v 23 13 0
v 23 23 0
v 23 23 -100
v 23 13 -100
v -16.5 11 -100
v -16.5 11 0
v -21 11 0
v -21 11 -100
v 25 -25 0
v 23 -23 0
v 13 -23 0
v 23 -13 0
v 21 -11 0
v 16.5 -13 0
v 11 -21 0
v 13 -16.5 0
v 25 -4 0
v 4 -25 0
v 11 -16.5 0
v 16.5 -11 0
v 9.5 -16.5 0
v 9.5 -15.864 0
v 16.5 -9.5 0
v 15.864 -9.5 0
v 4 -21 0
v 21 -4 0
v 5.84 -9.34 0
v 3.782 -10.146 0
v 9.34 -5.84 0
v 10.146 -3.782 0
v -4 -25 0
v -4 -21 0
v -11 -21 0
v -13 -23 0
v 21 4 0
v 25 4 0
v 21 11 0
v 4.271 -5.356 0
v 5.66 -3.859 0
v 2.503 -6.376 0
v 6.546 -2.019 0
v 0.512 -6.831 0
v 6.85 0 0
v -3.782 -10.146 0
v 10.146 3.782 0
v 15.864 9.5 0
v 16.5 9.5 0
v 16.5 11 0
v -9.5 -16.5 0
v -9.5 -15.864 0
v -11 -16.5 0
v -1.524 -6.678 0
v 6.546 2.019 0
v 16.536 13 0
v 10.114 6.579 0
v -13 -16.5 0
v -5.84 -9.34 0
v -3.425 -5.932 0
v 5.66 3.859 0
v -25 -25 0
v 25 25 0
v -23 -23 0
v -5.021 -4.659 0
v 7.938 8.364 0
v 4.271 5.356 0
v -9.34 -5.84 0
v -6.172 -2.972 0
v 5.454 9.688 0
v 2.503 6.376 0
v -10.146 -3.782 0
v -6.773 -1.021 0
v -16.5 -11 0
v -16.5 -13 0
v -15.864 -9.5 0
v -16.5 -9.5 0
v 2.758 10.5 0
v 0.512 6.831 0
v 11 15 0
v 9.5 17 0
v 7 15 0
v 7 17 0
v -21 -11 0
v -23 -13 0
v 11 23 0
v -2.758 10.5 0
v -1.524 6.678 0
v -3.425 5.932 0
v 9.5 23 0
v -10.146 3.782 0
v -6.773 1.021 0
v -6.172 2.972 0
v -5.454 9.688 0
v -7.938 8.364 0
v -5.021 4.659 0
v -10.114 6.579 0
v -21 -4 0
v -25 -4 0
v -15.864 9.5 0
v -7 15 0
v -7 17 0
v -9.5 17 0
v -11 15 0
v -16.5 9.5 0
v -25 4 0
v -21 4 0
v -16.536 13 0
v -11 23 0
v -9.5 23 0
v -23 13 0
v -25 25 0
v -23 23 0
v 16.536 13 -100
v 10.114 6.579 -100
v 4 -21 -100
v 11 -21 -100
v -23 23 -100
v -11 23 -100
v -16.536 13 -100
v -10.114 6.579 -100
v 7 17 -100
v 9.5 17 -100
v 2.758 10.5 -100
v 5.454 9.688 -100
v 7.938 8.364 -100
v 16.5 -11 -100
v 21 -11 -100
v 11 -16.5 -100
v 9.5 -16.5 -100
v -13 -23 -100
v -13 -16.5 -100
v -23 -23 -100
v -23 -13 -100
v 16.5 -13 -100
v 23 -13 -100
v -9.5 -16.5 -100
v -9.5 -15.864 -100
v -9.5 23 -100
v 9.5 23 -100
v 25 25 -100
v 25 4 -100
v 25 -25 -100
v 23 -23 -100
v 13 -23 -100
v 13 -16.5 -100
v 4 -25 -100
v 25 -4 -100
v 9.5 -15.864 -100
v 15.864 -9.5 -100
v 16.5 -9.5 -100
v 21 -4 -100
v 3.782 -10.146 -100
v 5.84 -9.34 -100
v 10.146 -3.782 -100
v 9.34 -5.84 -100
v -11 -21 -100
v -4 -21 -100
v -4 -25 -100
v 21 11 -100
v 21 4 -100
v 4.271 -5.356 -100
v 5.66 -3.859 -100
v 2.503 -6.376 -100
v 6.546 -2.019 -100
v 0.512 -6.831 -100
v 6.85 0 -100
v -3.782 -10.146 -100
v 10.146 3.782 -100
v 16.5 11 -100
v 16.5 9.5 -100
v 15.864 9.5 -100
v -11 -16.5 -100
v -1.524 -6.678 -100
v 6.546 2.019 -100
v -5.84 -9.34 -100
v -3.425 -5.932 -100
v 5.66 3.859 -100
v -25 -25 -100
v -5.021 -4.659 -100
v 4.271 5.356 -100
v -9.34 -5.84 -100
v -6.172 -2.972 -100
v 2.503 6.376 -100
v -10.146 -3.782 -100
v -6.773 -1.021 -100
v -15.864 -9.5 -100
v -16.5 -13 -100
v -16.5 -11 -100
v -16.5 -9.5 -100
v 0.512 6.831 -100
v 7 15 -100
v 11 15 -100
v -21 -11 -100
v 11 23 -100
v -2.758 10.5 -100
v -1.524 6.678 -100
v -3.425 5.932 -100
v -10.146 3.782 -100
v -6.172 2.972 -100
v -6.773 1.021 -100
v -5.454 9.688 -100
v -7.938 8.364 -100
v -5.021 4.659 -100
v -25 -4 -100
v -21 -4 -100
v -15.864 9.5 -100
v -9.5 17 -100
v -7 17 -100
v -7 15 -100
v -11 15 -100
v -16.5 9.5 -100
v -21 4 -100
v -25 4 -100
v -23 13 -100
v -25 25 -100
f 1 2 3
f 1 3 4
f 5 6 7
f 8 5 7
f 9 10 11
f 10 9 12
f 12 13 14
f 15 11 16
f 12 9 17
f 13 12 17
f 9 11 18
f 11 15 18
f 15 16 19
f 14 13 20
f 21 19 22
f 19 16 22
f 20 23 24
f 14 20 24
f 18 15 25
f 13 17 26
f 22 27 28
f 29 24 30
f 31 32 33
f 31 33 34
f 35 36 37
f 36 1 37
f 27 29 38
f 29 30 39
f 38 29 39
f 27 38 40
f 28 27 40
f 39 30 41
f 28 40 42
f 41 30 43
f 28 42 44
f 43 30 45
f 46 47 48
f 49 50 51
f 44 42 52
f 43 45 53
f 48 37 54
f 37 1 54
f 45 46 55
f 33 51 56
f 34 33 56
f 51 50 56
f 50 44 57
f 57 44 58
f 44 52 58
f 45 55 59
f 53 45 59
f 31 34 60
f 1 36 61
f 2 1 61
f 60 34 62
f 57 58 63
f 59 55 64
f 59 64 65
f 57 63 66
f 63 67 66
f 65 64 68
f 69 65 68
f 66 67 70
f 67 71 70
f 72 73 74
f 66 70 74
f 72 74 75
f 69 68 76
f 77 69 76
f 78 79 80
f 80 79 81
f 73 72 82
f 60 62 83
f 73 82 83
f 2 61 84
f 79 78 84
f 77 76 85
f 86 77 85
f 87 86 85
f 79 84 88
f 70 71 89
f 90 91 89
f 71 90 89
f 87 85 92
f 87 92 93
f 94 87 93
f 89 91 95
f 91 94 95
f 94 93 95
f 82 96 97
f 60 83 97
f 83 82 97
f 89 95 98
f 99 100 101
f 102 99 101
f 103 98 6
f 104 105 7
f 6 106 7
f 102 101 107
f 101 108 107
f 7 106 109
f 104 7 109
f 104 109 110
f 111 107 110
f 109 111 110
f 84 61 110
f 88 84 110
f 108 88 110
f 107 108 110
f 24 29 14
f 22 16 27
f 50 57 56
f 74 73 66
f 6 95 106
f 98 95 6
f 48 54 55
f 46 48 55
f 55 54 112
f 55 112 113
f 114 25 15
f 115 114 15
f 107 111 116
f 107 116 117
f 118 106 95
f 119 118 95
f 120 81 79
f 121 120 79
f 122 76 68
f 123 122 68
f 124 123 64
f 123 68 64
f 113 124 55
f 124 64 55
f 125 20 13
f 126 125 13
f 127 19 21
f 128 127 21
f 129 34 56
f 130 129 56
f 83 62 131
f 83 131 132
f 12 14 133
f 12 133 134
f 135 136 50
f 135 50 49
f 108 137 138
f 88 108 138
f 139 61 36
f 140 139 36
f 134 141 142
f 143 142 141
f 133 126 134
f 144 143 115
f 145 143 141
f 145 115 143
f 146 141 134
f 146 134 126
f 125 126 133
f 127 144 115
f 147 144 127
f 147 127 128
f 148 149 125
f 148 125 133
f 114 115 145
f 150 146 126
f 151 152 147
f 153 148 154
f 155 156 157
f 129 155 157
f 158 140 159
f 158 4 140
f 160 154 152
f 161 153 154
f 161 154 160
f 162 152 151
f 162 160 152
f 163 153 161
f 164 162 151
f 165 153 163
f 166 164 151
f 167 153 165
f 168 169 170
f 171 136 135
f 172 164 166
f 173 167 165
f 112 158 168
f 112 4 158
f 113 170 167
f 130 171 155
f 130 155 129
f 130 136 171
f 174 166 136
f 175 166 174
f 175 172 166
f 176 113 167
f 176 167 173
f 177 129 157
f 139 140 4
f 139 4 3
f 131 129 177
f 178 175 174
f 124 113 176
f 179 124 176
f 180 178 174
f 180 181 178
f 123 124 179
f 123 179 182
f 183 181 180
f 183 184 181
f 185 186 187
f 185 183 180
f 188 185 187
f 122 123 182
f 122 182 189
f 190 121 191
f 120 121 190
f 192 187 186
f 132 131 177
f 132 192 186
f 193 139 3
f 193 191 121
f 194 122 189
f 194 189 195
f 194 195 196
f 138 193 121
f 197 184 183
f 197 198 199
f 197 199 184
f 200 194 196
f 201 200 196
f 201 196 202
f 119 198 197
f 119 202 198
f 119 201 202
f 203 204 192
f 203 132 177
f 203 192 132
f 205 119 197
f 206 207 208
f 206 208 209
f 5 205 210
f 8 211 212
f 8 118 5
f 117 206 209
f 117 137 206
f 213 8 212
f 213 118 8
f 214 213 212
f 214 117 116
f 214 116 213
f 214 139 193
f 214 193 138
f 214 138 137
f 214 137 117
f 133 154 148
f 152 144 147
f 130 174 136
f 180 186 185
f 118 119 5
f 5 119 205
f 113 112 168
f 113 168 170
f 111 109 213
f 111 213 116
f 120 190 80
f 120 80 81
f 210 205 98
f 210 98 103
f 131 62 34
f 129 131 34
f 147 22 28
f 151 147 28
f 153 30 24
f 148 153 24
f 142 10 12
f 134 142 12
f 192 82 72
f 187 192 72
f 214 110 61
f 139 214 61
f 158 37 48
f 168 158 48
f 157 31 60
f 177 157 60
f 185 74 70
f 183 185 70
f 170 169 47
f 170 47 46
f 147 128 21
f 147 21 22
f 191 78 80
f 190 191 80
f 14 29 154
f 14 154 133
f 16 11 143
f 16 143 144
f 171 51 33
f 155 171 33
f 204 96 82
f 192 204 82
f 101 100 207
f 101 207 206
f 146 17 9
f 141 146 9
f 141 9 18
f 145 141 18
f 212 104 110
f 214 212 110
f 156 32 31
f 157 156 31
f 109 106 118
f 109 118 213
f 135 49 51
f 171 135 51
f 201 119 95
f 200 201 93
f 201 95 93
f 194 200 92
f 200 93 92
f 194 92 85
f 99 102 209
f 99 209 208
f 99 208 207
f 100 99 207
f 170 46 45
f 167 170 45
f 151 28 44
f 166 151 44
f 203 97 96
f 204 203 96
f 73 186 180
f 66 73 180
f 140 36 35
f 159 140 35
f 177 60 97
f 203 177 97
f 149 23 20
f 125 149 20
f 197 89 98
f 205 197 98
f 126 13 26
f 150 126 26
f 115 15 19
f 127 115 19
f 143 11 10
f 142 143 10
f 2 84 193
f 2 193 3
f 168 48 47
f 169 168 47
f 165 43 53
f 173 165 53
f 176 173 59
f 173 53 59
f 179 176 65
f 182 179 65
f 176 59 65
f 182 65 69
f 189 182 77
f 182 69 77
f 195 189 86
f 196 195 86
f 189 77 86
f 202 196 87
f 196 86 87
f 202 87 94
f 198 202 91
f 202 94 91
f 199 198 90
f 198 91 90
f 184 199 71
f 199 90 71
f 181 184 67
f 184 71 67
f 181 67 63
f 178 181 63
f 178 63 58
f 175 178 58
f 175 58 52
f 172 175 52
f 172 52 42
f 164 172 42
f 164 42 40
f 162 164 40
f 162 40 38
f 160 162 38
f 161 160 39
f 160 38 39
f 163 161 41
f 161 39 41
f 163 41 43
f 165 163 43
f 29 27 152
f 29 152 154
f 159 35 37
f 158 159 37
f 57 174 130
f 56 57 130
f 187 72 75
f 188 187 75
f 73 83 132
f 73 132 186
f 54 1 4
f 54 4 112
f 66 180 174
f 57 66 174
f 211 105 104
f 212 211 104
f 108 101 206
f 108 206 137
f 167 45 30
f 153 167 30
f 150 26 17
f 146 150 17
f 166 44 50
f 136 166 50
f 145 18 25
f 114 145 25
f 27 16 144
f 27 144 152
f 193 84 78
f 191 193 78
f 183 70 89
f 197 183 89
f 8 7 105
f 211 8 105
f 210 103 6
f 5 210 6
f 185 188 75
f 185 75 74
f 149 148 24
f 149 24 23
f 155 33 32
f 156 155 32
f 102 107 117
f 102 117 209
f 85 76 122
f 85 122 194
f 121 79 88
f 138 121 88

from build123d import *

# Parameters (mm, degrees)
SKETCH_A01_8_R     = 6.85
SKETCH_A01_8_W     = 10
SKETCH_A01_8_H     = 10
EXTRUDE1_DEPTH     = 100
CUT_EXTRUDE1_DEPTH = 101
CIRPATTERN1_COUNT  = 2
CIRPATTERN1_ANGLE  = 90
CUT_EXTRUDE2_DEPTH = 101
EXTRUDE3_DEPTH     = 100


with BuildPart() as part:
    # Sketch A01-8 → Extrude1 (new body)
    with BuildSketch(Plane.XY):
        Polygon((-16.5, -11), (-16.5, -9.5), (-15.863961, -9.5), (-10.14602885, -3.78206785), (-10.14602885, 3.78206785), (-15.863961, 9.5), (-16.5, 9.5), (-16.5, 11), (-21, 11), (-21, 4), (-25, 4), (-25, 25), (25, 25), (25, 4), (21, 4), (21, 11), (16.5, 11), (16.5, 9.5), (15.863961, 9.5), (10.14602885, 3.78206785), (10.14602885, -3.78206785), (15.863961, -9.5), (16.5, -9.5), (16.5, -11), (21, -11), (21, -4), (25, -4), (25, -25), (4, -25), (4, -21), (11, -21), (11, -16.5), (9.5, -16.5), (9.5, -15.863961), (3.78206785, -10.14602885), (-3.78206785, -10.14602885), (-9.5, -15.863961), (-9.5, -16.5), (-11, -16.5), (-11, -21), (-4, -21), (-4, -25), (-25, -25), (-25, -4), (-21, -4), (-21, -11), align=None)
        Circle(SKETCH_A01_8_R, mode=Mode.SUBTRACT)
        with Locations((-18, -18)):
            Rectangle(SKETCH_A01_8_W, SKETCH_A01_8_H, mode=Mode.SUBTRACT)
        with Locations((18, -18)):
            Rectangle(SKETCH_A01_8_W, SKETCH_A01_8_H, mode=Mode.SUBTRACT)
        Polygon((23, 13), (16.535534, 13), (14.035536811, 10.500002811), (-14.035536811, 10.500002811), (-16.535534, 13), (-23, 13), (-23, 23), (23, 23), align=None, mode=Mode.SUBTRACT)
    extrude(amount=-EXTRUDE1_DEPTH)

    # Sketch1 → Cut-Extrude1 (cut, through all)
    with BuildSketch(Plane.XY):
        Polygon((-16.5, -13), (-9.340048075, -5.840048075), (-5.840048075, -9.340048075), (-13, -16.5), align=None)
    cut_extrude1 = extrude(amount=-CUT_EXTRUDE1_DEPTH, mode=Mode.SUBTRACT)

    # CirPattern1: Cut-Extrude1 ×2 about axis
    cirpattern1_axis = Axis((0, 0, 0), (0, 0, 1))
    for i in range(1, CIRPATTERN1_COUNT):
        add(cut_extrude1.rotate(cirpattern1_axis, i * CIRPATTERN1_ANGLE / (CIRPATTERN1_COUNT - 1)), mode=Mode.SUBTRACT)

    # Sketch2 → Cut-Extrude2 (cut, through all)
    with BuildSketch(Plane.XY):
        with BuildLine():
            Line((-14.035536811, 10.500002811), (-10.114441476, 6.578907476))
            ThreePointArc((-10.114441476, 6.578907476), (0, 10.768446311), (10.114441476, 6.578907476))
            Line((10.114441476, 6.578907476), (14.035536811, 10.500002811))
            ThreePointArc((14.035536811, 10.500002811), (0, 16.313712513), (-14.035536811, 10.500002811))
        make_face()
    extrude(amount=-CUT_EXTRUDE2_DEPTH, mode=Mode.SUBTRACT)

    # Sketch3 → Extrude3 (add, through all)
    with BuildSketch(Plane.XY):
        Polygon((-11, 23), (-11, 15), (-7, 15), (-7, 17), (-9.5, 17), (-9.5, 23), align=None)
        Polygon((11, 23), (11, 15), (7, 15), (7, 17), (9.5, 17), (9.5, 23), align=None)
    extrude(amount=-EXTRUDE3_DEPTH)


solid = part.part
